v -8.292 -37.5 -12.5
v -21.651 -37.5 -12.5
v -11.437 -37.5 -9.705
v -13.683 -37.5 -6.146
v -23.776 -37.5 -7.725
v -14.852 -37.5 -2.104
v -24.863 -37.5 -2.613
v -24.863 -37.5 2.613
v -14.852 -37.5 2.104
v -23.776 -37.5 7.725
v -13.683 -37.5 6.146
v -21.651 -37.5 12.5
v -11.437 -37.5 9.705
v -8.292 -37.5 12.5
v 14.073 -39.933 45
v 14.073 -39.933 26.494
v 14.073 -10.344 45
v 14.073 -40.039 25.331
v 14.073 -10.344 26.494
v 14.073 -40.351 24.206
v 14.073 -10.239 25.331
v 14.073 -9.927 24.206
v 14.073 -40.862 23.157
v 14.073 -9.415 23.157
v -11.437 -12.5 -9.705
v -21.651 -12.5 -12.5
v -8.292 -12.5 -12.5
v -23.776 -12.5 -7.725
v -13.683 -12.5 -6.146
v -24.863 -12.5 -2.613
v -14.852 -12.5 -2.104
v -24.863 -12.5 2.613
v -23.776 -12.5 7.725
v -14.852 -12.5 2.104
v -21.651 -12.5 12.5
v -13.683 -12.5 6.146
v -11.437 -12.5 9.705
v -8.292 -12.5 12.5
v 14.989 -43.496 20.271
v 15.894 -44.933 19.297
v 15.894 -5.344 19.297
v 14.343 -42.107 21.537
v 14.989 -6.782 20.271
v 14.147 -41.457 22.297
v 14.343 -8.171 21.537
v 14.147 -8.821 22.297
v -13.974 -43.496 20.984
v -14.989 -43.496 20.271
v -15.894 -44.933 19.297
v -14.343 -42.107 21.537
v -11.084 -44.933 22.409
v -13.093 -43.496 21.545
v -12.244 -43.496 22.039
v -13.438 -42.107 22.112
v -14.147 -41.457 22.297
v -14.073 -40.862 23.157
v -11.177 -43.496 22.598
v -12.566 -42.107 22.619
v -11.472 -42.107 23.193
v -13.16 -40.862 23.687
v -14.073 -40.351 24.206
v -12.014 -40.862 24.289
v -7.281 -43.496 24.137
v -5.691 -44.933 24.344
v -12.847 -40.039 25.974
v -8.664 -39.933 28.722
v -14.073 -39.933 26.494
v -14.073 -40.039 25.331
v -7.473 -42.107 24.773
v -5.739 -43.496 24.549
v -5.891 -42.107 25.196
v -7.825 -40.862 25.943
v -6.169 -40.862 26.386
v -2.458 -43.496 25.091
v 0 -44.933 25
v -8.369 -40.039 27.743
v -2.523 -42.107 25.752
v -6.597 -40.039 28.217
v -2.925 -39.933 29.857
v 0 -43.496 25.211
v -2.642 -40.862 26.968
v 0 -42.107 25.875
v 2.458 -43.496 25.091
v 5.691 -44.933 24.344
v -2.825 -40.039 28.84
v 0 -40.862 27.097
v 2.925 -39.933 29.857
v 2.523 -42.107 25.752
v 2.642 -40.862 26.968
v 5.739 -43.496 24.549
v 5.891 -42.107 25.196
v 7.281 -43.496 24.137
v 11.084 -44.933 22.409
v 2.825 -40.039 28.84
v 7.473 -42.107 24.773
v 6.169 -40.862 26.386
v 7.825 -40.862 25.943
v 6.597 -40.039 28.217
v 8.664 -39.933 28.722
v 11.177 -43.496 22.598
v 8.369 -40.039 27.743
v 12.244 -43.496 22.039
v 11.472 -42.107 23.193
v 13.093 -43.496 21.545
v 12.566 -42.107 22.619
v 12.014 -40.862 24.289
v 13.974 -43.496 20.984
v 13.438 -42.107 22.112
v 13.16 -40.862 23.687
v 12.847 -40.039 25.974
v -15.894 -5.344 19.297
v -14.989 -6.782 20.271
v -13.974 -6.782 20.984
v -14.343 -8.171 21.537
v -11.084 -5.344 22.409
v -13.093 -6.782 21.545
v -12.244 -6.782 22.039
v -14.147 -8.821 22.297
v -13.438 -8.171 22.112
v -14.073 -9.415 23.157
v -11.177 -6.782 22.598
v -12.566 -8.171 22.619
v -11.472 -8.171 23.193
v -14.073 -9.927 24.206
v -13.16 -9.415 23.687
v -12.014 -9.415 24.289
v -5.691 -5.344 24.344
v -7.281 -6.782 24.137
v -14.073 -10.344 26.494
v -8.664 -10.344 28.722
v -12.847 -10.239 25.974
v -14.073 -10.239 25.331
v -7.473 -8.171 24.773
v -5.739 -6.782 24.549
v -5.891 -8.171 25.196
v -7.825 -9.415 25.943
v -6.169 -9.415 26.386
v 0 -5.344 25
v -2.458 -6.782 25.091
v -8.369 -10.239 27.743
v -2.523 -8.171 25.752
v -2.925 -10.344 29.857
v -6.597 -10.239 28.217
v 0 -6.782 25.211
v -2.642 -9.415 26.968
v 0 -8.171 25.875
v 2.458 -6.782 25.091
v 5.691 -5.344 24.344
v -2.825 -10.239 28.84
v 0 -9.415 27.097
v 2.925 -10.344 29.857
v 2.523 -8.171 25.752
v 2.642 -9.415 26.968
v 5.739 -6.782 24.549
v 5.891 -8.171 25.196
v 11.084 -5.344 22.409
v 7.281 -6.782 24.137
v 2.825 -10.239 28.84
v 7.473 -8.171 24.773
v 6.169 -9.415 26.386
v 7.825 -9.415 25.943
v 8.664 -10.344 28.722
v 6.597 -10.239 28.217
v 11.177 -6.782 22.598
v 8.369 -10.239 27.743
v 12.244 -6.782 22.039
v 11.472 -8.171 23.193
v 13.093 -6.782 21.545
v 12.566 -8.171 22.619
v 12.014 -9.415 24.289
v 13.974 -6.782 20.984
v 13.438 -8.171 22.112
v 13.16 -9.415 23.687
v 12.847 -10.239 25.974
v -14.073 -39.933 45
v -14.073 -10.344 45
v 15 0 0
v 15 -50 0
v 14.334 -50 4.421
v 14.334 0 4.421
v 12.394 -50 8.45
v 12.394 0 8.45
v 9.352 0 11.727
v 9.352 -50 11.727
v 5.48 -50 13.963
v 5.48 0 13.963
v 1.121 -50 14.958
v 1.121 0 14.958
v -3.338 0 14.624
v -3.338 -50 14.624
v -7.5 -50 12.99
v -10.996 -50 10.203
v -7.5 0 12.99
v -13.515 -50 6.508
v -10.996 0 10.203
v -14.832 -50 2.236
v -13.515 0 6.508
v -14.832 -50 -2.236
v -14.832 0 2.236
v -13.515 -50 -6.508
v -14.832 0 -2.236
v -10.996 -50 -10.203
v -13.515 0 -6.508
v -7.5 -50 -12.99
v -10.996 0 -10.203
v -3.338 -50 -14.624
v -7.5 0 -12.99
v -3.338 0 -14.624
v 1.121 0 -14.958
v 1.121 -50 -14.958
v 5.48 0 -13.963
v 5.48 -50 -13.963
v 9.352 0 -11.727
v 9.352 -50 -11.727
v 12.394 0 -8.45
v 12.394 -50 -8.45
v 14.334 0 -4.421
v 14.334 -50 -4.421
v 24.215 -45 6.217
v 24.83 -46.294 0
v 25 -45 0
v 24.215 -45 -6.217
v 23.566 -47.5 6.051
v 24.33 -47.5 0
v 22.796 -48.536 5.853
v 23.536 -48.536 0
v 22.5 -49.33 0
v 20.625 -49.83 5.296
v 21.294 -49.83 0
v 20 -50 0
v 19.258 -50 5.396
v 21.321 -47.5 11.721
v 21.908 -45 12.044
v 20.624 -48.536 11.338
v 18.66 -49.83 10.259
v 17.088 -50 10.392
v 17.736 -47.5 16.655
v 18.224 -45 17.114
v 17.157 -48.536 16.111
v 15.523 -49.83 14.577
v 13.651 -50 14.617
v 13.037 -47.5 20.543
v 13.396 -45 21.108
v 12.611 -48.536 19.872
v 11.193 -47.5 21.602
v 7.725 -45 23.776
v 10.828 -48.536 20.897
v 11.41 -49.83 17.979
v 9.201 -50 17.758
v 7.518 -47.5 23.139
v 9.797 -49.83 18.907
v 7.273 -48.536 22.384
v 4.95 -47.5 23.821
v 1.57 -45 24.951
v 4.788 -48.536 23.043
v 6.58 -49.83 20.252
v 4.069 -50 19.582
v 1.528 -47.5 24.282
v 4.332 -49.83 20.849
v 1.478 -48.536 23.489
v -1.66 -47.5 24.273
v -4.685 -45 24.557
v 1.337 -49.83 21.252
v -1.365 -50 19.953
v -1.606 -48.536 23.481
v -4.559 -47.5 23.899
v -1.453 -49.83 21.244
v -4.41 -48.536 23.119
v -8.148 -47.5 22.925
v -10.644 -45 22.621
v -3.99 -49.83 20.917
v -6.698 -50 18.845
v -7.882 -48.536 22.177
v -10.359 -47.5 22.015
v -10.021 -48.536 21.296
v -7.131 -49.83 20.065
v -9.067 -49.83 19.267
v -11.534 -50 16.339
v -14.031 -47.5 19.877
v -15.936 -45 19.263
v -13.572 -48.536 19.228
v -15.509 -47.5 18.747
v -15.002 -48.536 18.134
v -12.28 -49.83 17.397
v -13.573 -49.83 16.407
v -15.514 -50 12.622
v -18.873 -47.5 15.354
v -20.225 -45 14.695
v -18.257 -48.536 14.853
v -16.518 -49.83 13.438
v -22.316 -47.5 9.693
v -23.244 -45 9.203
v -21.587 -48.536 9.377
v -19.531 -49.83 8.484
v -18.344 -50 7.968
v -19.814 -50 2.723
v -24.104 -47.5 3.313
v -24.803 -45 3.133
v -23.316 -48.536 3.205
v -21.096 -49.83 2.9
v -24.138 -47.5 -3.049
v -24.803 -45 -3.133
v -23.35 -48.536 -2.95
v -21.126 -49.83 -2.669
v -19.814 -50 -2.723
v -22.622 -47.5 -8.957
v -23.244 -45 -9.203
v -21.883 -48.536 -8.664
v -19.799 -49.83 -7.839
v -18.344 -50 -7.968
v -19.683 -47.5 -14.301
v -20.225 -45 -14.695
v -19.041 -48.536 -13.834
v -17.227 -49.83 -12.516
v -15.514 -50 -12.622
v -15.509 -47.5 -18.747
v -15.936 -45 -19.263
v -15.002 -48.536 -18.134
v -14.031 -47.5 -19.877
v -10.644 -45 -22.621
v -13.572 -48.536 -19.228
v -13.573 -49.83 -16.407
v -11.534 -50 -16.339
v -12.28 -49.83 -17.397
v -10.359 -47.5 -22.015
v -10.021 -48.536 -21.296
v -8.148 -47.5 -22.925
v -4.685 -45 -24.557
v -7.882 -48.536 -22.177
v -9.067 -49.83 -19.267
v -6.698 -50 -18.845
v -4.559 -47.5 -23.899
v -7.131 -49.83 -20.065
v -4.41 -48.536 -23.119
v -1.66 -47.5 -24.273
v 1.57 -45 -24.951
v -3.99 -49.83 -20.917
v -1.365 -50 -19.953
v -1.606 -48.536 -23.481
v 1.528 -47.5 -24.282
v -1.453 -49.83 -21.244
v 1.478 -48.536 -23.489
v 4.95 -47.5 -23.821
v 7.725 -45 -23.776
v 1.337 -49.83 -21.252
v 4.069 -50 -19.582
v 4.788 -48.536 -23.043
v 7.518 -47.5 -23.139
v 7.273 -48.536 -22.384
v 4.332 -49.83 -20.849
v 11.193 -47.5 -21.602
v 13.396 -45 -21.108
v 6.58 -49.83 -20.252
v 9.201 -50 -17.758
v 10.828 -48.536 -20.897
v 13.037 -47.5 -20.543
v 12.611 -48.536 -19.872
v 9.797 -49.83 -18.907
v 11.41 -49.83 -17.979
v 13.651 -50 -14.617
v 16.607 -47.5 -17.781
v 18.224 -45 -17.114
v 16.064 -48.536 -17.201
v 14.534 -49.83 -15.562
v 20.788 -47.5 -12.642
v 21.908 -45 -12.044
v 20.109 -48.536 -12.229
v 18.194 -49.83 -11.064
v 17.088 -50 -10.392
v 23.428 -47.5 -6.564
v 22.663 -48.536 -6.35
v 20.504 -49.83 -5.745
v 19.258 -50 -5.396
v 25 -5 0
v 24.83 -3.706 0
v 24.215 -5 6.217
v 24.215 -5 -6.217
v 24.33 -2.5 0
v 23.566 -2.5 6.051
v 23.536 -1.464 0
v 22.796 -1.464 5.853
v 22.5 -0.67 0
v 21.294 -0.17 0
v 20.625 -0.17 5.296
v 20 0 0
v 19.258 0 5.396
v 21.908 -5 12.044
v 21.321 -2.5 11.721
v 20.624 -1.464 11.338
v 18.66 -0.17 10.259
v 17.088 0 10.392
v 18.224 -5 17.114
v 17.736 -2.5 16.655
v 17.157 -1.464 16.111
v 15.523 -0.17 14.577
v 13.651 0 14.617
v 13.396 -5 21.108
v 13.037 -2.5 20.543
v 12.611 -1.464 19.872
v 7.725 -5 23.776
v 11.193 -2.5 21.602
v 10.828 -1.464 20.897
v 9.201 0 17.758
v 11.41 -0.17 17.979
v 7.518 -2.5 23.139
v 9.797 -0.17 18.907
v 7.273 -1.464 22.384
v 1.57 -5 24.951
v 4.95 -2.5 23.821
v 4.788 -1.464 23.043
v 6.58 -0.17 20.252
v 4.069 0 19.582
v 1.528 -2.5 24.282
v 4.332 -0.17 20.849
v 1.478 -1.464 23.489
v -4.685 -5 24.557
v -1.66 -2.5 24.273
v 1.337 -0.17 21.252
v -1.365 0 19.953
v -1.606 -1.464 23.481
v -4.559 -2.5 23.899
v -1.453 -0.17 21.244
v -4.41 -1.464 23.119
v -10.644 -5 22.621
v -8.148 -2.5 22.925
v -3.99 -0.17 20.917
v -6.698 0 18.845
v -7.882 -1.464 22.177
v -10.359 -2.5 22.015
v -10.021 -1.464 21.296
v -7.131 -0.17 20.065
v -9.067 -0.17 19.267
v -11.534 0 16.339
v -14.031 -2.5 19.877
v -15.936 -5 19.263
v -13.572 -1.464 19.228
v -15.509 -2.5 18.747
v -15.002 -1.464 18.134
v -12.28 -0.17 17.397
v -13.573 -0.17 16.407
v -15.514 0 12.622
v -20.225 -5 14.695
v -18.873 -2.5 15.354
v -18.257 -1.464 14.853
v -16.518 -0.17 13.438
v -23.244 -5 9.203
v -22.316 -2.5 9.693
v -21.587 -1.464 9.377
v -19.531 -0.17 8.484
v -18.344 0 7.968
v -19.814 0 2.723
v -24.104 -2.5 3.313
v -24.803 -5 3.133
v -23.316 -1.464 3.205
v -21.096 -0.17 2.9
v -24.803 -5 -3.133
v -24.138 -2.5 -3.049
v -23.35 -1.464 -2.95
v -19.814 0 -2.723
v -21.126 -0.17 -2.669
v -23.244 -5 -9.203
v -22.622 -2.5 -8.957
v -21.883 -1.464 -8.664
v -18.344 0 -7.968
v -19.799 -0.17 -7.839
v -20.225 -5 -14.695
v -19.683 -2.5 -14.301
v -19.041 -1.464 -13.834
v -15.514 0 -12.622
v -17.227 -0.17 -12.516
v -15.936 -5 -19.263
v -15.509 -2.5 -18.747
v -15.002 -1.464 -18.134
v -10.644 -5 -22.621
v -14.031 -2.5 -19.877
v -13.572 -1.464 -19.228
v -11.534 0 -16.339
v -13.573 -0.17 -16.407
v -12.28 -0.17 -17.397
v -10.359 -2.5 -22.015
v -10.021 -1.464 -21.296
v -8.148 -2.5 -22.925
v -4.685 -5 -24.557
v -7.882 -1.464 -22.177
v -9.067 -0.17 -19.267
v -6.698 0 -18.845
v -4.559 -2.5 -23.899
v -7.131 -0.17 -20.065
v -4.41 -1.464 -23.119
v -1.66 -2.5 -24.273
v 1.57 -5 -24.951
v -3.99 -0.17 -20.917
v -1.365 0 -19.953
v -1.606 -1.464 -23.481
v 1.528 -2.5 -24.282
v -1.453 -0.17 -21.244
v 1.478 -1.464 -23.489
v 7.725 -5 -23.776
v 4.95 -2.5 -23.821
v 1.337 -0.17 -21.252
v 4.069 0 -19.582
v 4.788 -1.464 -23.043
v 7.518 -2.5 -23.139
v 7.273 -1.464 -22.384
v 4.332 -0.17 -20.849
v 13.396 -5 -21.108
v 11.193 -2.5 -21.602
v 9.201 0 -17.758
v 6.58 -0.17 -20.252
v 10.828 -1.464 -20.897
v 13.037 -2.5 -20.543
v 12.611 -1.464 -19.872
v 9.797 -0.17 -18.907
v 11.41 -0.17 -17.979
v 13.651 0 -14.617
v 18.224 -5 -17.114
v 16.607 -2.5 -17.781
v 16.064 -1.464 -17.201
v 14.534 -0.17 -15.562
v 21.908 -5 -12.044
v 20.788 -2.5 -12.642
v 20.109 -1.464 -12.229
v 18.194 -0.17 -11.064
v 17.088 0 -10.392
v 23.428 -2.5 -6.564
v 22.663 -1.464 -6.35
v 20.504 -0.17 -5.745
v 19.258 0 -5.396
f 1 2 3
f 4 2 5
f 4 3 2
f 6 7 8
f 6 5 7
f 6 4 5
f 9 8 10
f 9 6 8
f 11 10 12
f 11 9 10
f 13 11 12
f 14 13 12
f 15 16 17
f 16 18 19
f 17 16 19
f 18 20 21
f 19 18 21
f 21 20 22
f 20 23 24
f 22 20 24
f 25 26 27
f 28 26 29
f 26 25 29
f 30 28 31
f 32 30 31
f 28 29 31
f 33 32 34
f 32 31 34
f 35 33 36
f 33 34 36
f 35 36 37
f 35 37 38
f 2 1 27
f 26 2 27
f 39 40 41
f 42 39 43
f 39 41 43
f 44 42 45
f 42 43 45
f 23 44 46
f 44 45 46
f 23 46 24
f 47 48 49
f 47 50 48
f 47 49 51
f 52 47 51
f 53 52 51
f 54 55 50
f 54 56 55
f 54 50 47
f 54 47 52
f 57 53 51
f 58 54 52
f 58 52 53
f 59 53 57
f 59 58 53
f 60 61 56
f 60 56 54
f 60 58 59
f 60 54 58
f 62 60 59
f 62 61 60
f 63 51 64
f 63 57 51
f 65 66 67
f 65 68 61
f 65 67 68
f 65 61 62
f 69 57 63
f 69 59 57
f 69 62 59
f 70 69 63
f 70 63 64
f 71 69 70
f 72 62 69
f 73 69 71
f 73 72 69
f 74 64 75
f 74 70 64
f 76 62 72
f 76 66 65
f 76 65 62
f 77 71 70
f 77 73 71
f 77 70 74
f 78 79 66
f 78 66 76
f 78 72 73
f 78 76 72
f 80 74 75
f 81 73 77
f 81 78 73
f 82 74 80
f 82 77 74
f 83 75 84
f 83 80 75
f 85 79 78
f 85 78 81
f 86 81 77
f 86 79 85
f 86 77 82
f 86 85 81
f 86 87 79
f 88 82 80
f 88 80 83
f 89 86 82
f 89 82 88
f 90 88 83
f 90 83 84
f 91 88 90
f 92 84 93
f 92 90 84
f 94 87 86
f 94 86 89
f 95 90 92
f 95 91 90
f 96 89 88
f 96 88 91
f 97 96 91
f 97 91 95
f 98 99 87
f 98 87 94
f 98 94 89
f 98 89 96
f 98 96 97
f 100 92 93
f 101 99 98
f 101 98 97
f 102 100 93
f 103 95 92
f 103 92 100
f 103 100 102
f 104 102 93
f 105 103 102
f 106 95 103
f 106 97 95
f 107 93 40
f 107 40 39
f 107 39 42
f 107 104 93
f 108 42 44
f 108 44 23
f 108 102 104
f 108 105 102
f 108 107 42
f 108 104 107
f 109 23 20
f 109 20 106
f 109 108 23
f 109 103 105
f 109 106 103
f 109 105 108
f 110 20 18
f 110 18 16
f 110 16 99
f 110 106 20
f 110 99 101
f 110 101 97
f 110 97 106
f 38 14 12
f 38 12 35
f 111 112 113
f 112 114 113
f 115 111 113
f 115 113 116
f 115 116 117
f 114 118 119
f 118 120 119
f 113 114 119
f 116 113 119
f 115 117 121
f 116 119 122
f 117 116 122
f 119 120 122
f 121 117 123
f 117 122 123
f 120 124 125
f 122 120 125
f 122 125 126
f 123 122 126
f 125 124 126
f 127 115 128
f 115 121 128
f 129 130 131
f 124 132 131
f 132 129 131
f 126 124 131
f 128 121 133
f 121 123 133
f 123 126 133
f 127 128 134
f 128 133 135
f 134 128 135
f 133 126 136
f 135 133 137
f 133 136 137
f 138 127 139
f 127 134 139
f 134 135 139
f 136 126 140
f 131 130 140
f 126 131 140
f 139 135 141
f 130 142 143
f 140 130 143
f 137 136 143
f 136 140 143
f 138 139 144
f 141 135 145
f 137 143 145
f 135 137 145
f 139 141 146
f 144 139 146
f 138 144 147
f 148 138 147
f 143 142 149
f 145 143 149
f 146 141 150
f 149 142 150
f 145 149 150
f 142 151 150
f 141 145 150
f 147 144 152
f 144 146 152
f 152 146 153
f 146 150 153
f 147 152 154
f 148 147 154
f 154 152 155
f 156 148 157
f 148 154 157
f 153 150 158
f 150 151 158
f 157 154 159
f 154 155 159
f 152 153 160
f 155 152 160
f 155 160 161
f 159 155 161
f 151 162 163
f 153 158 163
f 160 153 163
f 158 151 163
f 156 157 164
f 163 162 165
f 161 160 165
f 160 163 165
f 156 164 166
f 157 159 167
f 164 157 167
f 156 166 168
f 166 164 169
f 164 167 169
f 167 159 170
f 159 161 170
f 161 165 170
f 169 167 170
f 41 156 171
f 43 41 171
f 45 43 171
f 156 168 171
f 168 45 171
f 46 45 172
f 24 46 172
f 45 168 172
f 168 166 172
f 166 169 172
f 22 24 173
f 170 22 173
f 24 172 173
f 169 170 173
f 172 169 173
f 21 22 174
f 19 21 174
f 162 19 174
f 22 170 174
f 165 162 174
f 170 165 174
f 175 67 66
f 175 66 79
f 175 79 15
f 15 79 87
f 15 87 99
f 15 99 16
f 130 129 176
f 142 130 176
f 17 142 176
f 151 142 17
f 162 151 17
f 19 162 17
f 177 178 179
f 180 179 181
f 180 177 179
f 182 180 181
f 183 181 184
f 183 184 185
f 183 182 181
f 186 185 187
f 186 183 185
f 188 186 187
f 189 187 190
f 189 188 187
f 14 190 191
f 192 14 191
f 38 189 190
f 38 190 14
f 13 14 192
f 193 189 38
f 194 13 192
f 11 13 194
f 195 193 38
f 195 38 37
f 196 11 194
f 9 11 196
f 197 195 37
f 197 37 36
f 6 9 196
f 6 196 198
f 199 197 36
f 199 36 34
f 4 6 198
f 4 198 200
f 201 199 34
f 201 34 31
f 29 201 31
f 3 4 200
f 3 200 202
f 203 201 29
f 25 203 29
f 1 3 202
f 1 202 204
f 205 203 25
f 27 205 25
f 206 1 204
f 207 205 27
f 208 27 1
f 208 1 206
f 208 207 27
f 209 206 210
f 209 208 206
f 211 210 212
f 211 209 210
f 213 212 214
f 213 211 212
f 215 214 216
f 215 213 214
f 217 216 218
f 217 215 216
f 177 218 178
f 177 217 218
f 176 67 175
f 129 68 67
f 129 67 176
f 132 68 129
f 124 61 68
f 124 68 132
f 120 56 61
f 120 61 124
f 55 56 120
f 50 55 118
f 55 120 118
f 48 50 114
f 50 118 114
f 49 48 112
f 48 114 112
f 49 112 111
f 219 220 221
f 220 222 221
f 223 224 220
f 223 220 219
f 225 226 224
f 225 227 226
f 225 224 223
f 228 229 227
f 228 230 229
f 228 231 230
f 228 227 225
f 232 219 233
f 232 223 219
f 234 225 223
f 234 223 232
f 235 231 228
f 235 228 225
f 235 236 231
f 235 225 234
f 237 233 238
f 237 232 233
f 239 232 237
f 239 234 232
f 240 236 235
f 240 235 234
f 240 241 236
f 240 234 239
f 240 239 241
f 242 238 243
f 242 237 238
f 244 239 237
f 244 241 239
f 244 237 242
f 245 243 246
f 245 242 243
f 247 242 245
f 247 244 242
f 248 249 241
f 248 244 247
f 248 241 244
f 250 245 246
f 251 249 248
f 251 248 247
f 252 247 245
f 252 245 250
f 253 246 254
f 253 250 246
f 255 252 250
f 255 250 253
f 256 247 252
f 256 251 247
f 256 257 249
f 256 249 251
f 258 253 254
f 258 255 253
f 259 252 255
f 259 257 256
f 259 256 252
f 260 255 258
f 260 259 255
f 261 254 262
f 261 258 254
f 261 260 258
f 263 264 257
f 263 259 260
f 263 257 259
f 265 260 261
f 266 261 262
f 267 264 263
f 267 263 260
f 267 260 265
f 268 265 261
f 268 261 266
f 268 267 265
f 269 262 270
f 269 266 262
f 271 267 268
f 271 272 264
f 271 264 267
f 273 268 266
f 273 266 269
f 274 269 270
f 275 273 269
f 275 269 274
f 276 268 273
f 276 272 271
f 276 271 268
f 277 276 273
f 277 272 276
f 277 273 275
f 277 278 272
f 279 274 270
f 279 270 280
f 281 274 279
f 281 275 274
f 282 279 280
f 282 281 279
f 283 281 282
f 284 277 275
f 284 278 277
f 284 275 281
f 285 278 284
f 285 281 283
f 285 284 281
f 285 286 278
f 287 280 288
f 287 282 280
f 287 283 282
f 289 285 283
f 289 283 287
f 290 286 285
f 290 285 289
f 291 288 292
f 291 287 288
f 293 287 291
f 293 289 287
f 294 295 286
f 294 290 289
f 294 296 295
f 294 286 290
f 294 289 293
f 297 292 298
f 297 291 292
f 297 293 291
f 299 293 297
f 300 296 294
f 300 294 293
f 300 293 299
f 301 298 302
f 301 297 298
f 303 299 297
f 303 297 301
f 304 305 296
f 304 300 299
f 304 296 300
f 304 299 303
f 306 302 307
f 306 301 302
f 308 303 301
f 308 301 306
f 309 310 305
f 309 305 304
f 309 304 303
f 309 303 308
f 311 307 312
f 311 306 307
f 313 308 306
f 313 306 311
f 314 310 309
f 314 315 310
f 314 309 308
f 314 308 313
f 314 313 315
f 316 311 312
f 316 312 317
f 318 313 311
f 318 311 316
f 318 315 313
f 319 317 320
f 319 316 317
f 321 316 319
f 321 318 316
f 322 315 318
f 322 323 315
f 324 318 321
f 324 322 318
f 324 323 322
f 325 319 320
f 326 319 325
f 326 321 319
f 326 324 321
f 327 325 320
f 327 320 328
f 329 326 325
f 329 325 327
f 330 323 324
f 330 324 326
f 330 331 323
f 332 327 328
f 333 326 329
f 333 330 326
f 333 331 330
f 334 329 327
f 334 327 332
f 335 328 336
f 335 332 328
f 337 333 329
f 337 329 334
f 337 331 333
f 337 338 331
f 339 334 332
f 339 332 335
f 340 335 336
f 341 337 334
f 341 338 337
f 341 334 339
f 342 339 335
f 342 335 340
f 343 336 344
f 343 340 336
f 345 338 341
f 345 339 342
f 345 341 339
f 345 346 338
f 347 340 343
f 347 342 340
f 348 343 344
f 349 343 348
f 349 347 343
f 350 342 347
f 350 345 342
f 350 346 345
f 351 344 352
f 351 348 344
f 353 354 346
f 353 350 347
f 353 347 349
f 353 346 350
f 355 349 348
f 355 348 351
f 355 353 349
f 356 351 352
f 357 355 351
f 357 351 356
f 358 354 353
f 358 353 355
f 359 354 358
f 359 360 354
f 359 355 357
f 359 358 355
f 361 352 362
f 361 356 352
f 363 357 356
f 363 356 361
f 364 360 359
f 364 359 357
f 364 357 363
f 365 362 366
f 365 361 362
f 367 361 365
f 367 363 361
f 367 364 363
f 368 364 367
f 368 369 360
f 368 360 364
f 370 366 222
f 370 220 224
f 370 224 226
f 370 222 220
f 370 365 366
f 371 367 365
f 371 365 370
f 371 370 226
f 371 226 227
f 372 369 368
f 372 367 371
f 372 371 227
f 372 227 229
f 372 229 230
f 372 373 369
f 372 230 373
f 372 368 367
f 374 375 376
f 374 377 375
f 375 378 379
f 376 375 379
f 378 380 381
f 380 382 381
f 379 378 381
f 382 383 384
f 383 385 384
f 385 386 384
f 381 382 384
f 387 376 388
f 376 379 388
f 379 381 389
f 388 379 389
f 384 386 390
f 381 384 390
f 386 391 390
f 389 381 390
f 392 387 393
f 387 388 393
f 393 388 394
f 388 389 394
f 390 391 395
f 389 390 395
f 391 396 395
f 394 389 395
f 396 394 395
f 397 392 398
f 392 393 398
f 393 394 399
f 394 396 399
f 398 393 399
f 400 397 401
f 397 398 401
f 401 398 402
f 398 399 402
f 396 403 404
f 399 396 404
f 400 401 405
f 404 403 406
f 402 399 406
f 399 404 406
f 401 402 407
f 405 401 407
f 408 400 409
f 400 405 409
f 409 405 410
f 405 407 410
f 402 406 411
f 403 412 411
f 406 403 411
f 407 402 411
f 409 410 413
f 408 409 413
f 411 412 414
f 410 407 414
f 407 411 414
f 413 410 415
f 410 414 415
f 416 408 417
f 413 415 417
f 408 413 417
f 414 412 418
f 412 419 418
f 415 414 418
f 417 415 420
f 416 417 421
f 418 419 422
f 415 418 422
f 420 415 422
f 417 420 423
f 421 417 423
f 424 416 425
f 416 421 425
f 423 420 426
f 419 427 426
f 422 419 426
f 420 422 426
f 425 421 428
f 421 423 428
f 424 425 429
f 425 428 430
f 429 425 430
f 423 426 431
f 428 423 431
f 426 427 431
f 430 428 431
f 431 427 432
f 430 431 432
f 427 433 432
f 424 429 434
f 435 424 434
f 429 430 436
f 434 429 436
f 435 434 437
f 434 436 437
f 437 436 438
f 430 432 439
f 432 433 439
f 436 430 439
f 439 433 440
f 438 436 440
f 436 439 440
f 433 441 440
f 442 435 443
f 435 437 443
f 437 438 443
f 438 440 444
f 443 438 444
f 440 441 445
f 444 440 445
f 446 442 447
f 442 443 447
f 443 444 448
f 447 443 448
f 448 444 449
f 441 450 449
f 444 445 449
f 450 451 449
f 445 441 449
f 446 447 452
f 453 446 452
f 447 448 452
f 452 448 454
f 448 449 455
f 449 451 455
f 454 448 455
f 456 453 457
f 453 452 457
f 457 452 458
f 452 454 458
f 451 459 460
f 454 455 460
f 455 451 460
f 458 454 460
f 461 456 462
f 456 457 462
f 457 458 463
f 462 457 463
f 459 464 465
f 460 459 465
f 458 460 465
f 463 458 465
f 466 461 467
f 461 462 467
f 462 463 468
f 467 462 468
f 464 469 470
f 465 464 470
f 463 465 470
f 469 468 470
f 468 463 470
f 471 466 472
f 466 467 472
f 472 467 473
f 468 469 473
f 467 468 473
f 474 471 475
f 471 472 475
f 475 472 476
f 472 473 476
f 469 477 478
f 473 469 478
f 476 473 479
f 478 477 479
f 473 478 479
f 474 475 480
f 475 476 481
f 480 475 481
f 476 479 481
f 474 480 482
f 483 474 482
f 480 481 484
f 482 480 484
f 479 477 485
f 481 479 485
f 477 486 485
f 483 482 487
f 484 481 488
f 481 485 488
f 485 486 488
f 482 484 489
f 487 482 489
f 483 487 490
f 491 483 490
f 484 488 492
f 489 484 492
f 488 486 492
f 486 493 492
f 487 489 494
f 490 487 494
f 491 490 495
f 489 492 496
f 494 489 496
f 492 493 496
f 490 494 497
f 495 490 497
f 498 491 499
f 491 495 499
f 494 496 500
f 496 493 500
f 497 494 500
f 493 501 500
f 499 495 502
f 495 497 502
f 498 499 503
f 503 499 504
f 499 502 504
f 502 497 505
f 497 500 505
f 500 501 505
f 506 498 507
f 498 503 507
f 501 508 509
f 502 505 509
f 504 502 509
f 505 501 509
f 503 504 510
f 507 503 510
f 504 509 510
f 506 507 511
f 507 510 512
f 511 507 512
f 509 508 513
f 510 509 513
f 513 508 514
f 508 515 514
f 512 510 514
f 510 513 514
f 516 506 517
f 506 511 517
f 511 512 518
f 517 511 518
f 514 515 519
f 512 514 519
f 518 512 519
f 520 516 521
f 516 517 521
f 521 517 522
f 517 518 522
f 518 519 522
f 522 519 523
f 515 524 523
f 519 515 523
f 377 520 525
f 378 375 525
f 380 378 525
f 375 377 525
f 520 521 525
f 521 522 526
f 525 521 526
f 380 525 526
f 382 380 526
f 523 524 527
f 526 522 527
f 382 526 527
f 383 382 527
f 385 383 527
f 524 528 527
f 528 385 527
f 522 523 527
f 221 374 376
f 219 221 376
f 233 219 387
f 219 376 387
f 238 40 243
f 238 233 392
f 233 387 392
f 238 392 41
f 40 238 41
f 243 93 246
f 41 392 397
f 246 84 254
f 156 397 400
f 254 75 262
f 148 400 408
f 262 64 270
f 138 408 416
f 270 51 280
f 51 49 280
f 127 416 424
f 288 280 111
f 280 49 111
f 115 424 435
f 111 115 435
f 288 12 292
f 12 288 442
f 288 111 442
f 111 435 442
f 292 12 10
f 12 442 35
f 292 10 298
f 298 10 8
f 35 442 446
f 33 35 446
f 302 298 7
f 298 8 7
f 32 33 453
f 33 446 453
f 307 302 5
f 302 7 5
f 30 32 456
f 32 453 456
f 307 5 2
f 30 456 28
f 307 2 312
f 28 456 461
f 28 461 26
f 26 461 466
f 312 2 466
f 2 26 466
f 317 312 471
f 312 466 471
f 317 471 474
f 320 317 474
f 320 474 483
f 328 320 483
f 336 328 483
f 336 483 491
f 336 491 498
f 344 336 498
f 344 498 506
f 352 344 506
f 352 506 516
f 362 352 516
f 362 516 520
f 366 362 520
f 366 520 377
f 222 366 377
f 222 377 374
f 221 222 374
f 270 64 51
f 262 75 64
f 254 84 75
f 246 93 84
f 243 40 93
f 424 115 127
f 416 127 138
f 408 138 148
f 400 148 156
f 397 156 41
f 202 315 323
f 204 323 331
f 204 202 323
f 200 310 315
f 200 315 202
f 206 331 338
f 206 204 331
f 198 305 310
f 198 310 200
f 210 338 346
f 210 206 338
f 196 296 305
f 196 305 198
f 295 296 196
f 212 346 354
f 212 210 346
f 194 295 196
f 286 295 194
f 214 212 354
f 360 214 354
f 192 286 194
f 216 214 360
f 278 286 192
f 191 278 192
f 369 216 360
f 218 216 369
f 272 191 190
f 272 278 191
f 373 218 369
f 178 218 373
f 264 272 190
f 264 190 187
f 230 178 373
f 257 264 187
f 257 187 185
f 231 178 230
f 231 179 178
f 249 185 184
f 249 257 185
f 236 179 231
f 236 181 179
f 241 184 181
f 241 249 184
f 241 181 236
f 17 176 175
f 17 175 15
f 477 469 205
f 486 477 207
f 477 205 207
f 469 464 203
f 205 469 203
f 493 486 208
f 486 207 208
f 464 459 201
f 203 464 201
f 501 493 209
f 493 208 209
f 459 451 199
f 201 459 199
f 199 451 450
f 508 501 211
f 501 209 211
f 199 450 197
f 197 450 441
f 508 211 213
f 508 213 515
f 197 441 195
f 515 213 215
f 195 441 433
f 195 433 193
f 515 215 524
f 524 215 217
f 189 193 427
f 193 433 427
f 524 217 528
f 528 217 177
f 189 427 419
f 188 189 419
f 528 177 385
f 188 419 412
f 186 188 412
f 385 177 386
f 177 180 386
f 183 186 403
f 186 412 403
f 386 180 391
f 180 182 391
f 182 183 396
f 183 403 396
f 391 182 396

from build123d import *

# Parameters (mm, degrees)
F0_R     = 25
F0_R_2   = 15
F1_DEPTH = 50
F2_W     = 25
F2_H     = 25
F3_DEPTH = 25
F5_R     = 5
F6_W     = 28.14582
F6_H     = 29.589206
F7_DEPTH = 25
F8_R     = 5


with BuildPart() as f1:
    # F0 (on Front) → F1 (new body)
    with BuildSketch(Plane.XZ):
        Circle(F0_R)
        Circle(F0_R_2, mode=Mode.SUBTRACT)
    extrude(amount=F1_DEPTH)

    # F2 (on Right) → F3 (cut)
    with BuildSketch(Plane.YZ):
        with Locations((-25, 0)):
            Rectangle(F2_W, F2_H)
    extrude(amount=-F3_DEPTH, mode=Mode.SUBTRACT)

    # F5
    f5_edges = [f1.edges().sort_by_distance(p)[0] for p in [
        (-25, -50, 0),
        (-25, 0, 0),
    ]]
    fillet(f5_edges, radius=F5_R)

    # F6 (on offset) → F7 (join)
    with BuildSketch(Plane.XY.offset(20)):
        with Locations((0, -25.138795)):
            Rectangle(F6_W, F6_H)
    extrude(amount=F7_DEPTH)

    # F8
    f8_edges = [f1.edges().sort_by_distance(p)[0] for p in [
        (-14.07291, -25.138795, 20.662846),
        (0, -10.344192, 25),
        (14.07291, -25.138795, 20.662846),
        (0, -39.933398, 25),
    ]]
    fillet(f8_edges, radius=F8_R)


solid = f1.part
